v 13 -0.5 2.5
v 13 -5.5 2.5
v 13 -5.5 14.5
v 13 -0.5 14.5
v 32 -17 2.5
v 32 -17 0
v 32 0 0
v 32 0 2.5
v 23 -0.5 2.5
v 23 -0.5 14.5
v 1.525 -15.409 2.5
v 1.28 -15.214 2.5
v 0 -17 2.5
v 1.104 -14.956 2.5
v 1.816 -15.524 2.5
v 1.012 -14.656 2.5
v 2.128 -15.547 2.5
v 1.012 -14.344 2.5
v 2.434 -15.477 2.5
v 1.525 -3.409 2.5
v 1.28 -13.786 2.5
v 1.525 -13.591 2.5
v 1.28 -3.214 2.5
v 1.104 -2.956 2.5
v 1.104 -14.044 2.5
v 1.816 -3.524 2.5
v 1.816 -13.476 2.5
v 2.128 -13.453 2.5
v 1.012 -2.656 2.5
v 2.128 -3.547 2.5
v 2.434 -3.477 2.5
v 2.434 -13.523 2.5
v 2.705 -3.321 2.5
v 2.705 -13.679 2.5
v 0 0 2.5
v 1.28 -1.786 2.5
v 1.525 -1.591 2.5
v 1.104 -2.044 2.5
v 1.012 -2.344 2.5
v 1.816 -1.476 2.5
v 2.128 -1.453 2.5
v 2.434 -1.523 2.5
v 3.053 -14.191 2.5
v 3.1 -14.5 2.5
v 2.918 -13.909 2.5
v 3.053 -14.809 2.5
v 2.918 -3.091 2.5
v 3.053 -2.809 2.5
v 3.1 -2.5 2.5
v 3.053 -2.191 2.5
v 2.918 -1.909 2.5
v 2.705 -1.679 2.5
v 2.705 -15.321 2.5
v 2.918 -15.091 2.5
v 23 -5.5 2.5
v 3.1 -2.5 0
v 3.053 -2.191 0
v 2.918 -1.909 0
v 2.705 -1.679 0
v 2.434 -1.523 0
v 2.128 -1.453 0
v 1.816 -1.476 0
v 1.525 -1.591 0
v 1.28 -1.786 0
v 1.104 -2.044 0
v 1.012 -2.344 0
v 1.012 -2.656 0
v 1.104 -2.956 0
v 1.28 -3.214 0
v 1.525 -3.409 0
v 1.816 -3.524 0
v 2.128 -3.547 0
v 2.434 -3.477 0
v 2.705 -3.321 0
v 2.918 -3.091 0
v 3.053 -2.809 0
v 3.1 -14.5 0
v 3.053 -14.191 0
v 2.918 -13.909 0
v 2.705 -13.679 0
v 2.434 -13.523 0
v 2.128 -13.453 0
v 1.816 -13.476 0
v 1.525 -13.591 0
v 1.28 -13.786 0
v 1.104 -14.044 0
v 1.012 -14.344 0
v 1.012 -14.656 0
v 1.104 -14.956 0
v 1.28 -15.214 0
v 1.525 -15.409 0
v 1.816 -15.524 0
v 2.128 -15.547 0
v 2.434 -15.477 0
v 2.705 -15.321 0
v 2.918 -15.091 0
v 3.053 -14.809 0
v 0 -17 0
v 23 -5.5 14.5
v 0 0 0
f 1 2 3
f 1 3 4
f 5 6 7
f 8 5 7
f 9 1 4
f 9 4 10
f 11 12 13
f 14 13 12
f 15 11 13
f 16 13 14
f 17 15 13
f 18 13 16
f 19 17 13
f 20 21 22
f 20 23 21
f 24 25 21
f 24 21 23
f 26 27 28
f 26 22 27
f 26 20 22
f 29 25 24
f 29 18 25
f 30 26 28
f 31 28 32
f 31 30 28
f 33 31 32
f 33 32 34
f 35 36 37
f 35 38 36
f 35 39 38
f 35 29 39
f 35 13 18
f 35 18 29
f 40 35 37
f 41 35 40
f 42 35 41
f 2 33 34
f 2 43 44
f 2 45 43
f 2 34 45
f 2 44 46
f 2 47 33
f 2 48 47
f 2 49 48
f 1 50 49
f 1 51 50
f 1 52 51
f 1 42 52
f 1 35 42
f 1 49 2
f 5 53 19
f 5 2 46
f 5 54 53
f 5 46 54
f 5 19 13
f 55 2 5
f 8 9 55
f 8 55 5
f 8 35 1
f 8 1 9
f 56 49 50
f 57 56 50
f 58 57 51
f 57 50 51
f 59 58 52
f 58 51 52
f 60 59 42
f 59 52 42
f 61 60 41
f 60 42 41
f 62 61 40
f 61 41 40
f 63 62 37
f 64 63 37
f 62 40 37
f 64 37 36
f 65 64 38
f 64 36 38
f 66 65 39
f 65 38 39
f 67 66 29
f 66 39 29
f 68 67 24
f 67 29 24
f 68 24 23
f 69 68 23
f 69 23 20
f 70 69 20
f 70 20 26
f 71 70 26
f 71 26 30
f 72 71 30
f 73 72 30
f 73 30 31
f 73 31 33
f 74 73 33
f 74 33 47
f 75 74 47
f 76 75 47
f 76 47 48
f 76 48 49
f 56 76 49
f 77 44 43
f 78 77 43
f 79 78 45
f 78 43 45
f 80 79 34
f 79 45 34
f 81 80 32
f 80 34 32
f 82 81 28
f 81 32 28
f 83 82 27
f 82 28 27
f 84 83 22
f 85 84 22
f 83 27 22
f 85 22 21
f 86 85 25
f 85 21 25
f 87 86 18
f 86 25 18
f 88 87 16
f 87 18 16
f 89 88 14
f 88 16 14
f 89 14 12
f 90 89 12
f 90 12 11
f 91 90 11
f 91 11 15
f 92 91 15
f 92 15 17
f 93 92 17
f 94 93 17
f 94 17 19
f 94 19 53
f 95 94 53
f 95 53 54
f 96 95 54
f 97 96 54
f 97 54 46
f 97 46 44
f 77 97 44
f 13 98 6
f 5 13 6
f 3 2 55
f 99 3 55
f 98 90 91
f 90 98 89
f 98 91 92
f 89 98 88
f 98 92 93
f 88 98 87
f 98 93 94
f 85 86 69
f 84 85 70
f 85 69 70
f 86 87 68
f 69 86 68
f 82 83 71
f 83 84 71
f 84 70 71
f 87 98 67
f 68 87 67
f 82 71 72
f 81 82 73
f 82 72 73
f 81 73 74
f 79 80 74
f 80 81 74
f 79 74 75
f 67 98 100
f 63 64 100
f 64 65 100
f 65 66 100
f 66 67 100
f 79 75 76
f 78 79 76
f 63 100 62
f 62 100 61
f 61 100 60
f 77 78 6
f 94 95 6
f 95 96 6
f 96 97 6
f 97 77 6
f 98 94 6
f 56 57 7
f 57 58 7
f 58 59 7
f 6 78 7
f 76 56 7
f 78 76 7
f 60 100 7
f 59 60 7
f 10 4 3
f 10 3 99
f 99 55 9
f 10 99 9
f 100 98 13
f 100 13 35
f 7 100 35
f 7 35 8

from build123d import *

# Parameters (mm, degrees)
SKETCH1_W           = 32
SKETCH1_H           = 17
BOSS_EXTRUDE1_DEPTH = 2.5
SKETCH2_W           = 10
SKETCH2_H           = 5
BOSS_EXTRUDE2_DEPTH = 12
SKETCH3_R           = 1.05
CUT_EXTRUDE1_DEPTH  = 12


with BuildPart() as part:
    # Sketch1 → Boss-Extrude1 (new body)
    with BuildSketch(Plane.XY):
        with Locations((16, -8.5)):
            Rectangle(SKETCH1_W, SKETCH1_H)
    extrude(amount=BOSS_EXTRUDE1_DEPTH)

    # Sketch2 → Boss-Extrude2 (add)
    with BuildSketch(Plane.XY.offset(2.5)):
        with Locations((18, -3)):
            Rectangle(SKETCH2_W, SKETCH2_H)
    extrude(amount=BOSS_EXTRUDE2_DEPTH)

    # Sketch3 → Cut-Extrude1 (cut)
    with BuildSketch(Plane.XY.offset(2.5)):
        with Locations((2.05, -2.5)):
            Circle(SKETCH3_R)
        with Locations((2.05, -14.5)):
            Circle(SKETCH3_R)
    extrude(amount=-CUT_EXTRUDE1_DEPTH, mode=Mode.SUBTRACT)


solid = part.part
